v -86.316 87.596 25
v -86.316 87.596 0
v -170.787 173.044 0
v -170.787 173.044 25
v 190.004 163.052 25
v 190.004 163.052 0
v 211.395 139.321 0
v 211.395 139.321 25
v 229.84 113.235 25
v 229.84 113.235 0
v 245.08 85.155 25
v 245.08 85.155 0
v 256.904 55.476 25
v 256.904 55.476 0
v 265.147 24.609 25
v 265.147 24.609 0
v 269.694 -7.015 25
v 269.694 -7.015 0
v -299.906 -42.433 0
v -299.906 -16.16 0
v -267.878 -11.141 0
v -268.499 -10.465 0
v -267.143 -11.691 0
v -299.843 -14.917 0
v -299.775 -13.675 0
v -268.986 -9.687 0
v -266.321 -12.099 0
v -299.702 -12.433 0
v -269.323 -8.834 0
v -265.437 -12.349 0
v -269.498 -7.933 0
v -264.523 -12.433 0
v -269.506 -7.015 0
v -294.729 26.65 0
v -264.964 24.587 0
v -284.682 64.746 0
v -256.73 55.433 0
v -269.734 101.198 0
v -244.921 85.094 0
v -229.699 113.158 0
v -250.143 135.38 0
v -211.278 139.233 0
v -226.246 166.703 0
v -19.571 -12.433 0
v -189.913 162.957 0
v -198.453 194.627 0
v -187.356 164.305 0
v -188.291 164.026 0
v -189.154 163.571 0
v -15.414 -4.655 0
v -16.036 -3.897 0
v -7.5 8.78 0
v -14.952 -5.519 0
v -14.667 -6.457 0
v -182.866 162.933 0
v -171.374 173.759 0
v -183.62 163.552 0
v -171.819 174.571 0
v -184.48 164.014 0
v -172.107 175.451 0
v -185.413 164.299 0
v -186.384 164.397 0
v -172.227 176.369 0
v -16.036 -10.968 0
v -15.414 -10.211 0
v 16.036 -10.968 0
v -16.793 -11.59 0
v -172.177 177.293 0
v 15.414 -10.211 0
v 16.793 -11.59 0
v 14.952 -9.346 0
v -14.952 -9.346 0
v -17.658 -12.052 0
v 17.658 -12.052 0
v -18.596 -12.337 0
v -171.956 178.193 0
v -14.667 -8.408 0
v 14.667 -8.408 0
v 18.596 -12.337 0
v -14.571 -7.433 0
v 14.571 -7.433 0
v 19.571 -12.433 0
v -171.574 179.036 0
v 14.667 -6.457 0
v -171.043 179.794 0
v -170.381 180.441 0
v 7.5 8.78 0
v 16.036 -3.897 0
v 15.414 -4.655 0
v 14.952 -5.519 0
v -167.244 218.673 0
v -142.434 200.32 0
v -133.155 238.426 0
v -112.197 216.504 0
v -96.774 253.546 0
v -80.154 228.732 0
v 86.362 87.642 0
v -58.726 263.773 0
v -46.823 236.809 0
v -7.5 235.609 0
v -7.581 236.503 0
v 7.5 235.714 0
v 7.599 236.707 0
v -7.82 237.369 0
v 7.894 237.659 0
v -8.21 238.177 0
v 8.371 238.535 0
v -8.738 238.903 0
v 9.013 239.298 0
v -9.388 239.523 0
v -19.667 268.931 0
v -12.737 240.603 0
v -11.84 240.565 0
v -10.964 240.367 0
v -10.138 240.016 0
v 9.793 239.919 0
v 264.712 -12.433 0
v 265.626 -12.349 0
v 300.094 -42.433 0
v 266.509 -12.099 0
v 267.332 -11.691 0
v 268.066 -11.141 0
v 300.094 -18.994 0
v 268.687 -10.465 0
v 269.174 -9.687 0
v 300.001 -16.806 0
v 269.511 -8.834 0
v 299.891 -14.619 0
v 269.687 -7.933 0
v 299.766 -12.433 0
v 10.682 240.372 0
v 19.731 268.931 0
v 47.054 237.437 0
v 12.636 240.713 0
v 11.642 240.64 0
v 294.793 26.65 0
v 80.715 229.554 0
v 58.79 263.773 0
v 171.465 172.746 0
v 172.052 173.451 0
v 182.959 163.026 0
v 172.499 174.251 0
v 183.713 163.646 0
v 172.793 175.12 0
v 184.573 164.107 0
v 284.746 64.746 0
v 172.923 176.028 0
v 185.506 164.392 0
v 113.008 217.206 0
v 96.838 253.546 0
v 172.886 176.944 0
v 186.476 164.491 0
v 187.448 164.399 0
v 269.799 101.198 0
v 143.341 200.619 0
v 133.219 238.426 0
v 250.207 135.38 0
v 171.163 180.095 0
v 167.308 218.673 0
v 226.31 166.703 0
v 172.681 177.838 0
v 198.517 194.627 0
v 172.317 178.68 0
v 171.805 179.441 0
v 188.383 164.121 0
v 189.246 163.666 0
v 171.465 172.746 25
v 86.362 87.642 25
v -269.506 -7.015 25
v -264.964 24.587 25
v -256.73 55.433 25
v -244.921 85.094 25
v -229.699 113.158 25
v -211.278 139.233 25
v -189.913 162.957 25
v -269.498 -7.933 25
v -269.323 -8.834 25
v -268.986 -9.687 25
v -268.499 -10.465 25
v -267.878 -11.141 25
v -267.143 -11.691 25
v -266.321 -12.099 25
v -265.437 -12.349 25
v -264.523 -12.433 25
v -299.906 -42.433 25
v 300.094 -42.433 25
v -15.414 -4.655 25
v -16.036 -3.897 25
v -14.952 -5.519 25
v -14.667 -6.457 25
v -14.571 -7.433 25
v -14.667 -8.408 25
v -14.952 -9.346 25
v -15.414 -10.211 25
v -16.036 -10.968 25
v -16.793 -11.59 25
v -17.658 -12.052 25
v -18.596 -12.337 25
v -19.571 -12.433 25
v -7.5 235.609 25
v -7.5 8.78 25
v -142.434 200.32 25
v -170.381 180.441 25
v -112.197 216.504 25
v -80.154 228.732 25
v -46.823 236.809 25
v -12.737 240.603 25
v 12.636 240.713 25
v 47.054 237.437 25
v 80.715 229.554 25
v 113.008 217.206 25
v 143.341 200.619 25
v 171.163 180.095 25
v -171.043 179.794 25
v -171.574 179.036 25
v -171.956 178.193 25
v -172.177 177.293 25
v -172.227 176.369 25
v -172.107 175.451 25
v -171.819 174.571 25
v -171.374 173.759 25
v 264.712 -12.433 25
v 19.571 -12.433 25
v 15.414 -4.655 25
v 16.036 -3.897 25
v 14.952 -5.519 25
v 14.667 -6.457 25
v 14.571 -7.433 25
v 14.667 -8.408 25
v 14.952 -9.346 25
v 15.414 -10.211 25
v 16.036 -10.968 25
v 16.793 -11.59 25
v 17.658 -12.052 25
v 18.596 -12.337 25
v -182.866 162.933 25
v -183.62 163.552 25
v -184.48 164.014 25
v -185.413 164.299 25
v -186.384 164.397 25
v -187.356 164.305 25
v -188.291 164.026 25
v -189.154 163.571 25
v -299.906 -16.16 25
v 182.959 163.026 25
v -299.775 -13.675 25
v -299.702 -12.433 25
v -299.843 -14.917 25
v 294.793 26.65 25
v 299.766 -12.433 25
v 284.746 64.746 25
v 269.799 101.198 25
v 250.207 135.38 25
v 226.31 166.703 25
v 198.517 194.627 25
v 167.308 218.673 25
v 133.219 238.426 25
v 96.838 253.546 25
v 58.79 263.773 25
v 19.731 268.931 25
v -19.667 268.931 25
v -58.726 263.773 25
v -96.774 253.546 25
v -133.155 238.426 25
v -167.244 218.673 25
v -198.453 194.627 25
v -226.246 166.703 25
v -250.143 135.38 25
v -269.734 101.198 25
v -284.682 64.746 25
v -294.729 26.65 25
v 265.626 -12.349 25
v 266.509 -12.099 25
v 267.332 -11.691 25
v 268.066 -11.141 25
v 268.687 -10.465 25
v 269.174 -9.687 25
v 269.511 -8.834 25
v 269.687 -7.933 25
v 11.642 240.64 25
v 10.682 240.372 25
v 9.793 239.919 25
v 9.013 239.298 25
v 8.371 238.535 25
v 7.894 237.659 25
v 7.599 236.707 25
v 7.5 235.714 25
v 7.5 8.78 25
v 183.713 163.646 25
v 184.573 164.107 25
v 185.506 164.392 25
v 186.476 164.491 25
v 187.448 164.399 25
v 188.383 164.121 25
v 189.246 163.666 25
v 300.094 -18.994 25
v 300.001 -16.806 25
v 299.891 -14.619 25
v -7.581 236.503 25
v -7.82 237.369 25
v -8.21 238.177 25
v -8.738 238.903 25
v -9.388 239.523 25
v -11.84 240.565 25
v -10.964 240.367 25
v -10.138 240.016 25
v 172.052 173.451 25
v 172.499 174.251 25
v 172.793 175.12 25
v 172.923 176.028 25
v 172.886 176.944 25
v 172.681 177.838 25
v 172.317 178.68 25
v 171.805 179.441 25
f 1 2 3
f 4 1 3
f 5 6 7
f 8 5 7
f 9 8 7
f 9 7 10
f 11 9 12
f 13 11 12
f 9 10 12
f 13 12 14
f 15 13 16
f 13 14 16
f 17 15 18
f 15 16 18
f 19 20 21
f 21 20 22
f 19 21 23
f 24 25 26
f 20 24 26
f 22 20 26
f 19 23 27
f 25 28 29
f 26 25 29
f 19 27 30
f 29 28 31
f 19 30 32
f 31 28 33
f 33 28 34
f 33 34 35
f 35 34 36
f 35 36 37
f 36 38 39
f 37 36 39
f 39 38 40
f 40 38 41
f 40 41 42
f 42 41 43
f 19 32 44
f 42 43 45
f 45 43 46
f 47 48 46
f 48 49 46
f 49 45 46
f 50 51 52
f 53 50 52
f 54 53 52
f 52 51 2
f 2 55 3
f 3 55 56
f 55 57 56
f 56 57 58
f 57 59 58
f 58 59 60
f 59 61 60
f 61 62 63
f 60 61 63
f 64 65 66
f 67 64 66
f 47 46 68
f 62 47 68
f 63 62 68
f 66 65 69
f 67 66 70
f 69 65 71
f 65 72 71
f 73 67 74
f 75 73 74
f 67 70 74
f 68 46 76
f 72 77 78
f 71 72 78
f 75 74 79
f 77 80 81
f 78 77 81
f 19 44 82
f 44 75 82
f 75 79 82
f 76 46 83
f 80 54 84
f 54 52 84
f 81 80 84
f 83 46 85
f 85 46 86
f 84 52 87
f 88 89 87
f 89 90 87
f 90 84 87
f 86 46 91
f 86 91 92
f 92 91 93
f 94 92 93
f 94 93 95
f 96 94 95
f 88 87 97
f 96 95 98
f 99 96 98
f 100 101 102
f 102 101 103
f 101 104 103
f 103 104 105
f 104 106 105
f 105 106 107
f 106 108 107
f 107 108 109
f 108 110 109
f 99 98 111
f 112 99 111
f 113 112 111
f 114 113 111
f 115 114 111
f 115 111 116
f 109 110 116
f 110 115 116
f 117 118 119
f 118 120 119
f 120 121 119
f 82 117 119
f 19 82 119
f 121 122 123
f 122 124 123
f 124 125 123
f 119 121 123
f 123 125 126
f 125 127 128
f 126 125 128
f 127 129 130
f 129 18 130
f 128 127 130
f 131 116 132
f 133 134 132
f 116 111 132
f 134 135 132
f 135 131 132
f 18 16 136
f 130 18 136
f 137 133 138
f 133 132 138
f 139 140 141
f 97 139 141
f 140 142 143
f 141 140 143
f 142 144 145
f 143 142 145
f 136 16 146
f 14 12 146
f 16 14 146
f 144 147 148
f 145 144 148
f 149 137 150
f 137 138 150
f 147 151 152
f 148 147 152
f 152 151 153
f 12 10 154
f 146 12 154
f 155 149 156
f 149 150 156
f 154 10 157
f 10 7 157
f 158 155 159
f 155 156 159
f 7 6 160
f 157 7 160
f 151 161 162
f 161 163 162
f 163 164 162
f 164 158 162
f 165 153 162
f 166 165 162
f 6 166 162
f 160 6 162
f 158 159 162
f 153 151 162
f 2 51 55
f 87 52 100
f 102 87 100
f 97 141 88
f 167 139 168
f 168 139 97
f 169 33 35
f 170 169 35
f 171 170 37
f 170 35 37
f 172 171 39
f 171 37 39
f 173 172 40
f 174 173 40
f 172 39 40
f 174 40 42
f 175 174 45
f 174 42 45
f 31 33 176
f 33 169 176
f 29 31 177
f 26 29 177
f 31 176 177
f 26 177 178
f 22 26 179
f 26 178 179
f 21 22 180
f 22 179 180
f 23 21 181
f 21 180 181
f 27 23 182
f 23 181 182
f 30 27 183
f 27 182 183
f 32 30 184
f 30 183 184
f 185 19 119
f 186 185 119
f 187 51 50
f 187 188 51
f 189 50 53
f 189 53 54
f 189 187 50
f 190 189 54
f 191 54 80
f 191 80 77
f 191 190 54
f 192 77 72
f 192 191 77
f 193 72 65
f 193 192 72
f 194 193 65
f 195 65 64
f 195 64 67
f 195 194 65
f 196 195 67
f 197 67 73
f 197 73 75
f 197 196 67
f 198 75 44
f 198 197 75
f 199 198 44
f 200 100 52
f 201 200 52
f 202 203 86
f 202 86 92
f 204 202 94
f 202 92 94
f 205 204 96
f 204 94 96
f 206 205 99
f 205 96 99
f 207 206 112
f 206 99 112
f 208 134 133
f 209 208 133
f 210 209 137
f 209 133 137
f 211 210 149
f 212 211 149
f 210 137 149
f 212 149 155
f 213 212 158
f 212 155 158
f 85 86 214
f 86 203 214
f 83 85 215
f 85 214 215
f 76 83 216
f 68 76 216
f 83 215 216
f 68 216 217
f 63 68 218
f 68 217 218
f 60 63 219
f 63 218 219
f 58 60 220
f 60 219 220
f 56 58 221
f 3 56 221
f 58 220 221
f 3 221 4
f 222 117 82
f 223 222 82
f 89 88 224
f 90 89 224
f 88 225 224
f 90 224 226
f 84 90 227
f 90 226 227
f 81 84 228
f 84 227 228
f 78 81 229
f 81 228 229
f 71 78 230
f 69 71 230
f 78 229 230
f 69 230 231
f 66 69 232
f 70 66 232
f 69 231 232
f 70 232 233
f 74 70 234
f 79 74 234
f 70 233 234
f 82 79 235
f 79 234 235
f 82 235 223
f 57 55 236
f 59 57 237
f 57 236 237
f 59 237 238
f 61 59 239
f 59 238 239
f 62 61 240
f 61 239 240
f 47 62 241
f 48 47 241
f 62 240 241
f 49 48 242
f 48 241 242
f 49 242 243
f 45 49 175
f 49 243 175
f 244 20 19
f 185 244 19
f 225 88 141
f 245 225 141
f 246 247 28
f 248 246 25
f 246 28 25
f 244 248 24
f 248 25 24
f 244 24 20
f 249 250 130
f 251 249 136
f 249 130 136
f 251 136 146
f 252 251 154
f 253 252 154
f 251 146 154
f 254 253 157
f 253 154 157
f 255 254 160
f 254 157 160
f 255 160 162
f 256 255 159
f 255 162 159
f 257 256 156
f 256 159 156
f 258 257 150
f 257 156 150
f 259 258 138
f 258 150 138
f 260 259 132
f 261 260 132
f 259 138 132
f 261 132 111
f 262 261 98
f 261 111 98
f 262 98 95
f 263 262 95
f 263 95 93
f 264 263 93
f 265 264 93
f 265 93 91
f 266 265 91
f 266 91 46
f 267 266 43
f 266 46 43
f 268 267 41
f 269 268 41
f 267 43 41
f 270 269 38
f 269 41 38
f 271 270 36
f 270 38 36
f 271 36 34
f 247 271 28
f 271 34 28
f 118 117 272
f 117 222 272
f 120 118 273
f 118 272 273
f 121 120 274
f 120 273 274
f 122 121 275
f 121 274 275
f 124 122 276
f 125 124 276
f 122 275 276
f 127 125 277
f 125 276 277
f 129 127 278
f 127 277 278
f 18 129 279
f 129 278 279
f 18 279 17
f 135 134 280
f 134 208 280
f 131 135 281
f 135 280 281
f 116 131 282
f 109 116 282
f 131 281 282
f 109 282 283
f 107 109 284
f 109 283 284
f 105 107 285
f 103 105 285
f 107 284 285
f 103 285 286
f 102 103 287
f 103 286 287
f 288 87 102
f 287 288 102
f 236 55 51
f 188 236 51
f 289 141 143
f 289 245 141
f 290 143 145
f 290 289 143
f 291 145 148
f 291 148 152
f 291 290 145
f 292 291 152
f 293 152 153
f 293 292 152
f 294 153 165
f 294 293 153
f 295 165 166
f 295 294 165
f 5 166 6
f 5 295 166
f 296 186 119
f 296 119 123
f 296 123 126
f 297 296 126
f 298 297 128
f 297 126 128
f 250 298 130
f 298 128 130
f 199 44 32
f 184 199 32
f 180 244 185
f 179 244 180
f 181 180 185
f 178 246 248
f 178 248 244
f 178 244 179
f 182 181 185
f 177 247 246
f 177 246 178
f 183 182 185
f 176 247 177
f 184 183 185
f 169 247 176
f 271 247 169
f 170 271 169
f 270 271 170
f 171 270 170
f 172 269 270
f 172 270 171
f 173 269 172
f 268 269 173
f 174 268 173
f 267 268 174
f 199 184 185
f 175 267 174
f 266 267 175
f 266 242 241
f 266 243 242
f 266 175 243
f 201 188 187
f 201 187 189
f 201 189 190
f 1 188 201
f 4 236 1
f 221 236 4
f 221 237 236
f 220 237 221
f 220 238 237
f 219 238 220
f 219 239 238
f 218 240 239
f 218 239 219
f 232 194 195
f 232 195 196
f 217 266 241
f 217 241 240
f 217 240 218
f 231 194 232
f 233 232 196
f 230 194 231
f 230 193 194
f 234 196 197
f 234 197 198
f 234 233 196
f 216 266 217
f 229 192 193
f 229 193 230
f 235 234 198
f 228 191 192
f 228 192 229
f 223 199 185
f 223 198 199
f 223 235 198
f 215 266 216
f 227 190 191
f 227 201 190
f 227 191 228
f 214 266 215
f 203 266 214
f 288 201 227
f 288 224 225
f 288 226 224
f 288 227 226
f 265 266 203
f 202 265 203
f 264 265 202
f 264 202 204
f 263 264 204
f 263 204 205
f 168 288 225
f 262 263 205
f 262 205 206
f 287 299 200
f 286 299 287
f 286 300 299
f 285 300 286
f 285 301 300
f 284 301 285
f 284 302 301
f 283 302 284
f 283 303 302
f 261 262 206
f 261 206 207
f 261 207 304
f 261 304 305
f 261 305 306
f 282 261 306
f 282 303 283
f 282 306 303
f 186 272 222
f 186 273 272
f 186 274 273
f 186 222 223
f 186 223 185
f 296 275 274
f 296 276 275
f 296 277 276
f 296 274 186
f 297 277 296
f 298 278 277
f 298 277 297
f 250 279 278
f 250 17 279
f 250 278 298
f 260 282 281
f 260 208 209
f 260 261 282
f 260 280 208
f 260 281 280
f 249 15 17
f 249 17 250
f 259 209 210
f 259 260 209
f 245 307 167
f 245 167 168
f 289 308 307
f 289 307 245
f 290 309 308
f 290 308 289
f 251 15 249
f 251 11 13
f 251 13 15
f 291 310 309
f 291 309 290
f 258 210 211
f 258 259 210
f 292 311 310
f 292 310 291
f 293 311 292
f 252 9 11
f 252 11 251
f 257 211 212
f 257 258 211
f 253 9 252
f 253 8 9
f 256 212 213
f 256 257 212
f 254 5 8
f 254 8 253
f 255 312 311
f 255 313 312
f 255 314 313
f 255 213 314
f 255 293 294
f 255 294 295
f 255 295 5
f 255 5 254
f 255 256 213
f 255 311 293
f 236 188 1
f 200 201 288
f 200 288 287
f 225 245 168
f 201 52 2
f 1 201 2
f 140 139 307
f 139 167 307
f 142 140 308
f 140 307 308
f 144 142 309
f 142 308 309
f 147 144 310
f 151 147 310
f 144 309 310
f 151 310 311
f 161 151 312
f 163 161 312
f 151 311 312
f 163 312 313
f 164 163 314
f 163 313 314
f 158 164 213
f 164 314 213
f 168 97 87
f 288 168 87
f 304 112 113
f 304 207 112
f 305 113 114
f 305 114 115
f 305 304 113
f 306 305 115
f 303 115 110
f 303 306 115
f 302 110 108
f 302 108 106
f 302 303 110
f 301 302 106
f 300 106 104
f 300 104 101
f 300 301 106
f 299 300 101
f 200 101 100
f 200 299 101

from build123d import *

# Parameters (mm, degrees)
F1_DEPTH = 25
F2_R     = 5
F3_R     = 5


with BuildPart() as f1:
    # F0 (on Top) → F1 (new body)
    with BuildSketch(Plane.XY):
        with BuildLine():
            Line((-299.905914, -16.159892), (-299.905914, -42.432796))
            Line((-299.905914, -42.432796), (300.094086, -42.432796))
            Line((300.094086, -42.432796), (300.094086, -18.9935))
            ThreePointArc((300.094086, -18.9935), (299.947953, -15.712251), (299.765939, -12.432796))
            ThreePointArc((299.765939, -12.432796), (0.032047, 269.577673), (-299.701846, -12.432796))
            ThreePointArc((-299.701846, -12.432796), (-299.809671, -14.296027), (-299.905914, -16.159892))
        make_face()
        with BuildLine():
            Line((-7.5, -12.432796), (-269.905914, -12.432796))
            ThreePointArc((-269.905914, -12.432796), (-245.019334, 84.882969), (-186.345143, 166.412347))
            Line((-186.345143, 166.412347), (-7.5, -12.432796))
        make_face(mode=Mode.SUBTRACT)
        with BuildLine():
            ThreePointArc((186.436841, 166.504045), (245.179328, 84.94326), (270.094086, -12.432796))
            Line((270.094086, -12.432796), (7.5, -12.432796))
            Line((7.5, -12.432796), (186.436841, 166.504045))
        make_face(mode=Mode.SUBTRACT)
        with BuildLine():
            Line((-7.5, 240.801209), (-7.5, 49.689975))
            Line((-7.5, 49.689975), (-7.5, 8.780407))
            Line((-7.5, 8.780407), (-86.31597, 87.596377))
            Line((-86.31597, 87.596377), (-174.624587, 176.925959))
            ThreePointArc((-174.624587, 176.925959), (-96.495237, 223.078456), (-7.5, 240.801209))
        make_face(mode=Mode.SUBTRACT)
        with BuildLine():
            Line((7.5, 8.780407), (7.5, 49.689975))
            Line((7.5, 49.689975), (7.5, 240.801209))
            ThreePointArc((7.5, 240.801209), (97.204461, 223.874551), (175.263477, 176.543885))
            Line((175.263477, 176.543885), (86.361819, 87.642226))
            Line((86.361819, 87.642226), (7.5, 8.780407))
        make_face(mode=Mode.SUBTRACT)
    extrude(amount=F1_DEPTH)

    # F2
    f2_edges = [f1.edges().sort_by_distance(p)[0] for p in [
        (-7.5, 240.801209, 12.5),
        (175.263477, 176.543885, 12.5),
        (270.094086, -12.432796, 12.5),
        (7.5, 240.801209, 12.5),
        (-186.345143, 166.412347, 12.5),
        (-269.905914, -12.432796, 12.5),
        (186.436841, 166.504045, 12.5),
        (-174.624587, 176.925959, 12.5),
    ]]
    fillet(f2_edges, radius=F2_R)

    # F3
    f3_edges = [f1.edges().sort_by_distance(p)[0] for p in [
        (7.5, -12.432796, 12.5),
        (-7.5, -12.432796, 12.5),
    ]]
    fillet(f3_edges, radius=F3_R)


solid = f1.part
